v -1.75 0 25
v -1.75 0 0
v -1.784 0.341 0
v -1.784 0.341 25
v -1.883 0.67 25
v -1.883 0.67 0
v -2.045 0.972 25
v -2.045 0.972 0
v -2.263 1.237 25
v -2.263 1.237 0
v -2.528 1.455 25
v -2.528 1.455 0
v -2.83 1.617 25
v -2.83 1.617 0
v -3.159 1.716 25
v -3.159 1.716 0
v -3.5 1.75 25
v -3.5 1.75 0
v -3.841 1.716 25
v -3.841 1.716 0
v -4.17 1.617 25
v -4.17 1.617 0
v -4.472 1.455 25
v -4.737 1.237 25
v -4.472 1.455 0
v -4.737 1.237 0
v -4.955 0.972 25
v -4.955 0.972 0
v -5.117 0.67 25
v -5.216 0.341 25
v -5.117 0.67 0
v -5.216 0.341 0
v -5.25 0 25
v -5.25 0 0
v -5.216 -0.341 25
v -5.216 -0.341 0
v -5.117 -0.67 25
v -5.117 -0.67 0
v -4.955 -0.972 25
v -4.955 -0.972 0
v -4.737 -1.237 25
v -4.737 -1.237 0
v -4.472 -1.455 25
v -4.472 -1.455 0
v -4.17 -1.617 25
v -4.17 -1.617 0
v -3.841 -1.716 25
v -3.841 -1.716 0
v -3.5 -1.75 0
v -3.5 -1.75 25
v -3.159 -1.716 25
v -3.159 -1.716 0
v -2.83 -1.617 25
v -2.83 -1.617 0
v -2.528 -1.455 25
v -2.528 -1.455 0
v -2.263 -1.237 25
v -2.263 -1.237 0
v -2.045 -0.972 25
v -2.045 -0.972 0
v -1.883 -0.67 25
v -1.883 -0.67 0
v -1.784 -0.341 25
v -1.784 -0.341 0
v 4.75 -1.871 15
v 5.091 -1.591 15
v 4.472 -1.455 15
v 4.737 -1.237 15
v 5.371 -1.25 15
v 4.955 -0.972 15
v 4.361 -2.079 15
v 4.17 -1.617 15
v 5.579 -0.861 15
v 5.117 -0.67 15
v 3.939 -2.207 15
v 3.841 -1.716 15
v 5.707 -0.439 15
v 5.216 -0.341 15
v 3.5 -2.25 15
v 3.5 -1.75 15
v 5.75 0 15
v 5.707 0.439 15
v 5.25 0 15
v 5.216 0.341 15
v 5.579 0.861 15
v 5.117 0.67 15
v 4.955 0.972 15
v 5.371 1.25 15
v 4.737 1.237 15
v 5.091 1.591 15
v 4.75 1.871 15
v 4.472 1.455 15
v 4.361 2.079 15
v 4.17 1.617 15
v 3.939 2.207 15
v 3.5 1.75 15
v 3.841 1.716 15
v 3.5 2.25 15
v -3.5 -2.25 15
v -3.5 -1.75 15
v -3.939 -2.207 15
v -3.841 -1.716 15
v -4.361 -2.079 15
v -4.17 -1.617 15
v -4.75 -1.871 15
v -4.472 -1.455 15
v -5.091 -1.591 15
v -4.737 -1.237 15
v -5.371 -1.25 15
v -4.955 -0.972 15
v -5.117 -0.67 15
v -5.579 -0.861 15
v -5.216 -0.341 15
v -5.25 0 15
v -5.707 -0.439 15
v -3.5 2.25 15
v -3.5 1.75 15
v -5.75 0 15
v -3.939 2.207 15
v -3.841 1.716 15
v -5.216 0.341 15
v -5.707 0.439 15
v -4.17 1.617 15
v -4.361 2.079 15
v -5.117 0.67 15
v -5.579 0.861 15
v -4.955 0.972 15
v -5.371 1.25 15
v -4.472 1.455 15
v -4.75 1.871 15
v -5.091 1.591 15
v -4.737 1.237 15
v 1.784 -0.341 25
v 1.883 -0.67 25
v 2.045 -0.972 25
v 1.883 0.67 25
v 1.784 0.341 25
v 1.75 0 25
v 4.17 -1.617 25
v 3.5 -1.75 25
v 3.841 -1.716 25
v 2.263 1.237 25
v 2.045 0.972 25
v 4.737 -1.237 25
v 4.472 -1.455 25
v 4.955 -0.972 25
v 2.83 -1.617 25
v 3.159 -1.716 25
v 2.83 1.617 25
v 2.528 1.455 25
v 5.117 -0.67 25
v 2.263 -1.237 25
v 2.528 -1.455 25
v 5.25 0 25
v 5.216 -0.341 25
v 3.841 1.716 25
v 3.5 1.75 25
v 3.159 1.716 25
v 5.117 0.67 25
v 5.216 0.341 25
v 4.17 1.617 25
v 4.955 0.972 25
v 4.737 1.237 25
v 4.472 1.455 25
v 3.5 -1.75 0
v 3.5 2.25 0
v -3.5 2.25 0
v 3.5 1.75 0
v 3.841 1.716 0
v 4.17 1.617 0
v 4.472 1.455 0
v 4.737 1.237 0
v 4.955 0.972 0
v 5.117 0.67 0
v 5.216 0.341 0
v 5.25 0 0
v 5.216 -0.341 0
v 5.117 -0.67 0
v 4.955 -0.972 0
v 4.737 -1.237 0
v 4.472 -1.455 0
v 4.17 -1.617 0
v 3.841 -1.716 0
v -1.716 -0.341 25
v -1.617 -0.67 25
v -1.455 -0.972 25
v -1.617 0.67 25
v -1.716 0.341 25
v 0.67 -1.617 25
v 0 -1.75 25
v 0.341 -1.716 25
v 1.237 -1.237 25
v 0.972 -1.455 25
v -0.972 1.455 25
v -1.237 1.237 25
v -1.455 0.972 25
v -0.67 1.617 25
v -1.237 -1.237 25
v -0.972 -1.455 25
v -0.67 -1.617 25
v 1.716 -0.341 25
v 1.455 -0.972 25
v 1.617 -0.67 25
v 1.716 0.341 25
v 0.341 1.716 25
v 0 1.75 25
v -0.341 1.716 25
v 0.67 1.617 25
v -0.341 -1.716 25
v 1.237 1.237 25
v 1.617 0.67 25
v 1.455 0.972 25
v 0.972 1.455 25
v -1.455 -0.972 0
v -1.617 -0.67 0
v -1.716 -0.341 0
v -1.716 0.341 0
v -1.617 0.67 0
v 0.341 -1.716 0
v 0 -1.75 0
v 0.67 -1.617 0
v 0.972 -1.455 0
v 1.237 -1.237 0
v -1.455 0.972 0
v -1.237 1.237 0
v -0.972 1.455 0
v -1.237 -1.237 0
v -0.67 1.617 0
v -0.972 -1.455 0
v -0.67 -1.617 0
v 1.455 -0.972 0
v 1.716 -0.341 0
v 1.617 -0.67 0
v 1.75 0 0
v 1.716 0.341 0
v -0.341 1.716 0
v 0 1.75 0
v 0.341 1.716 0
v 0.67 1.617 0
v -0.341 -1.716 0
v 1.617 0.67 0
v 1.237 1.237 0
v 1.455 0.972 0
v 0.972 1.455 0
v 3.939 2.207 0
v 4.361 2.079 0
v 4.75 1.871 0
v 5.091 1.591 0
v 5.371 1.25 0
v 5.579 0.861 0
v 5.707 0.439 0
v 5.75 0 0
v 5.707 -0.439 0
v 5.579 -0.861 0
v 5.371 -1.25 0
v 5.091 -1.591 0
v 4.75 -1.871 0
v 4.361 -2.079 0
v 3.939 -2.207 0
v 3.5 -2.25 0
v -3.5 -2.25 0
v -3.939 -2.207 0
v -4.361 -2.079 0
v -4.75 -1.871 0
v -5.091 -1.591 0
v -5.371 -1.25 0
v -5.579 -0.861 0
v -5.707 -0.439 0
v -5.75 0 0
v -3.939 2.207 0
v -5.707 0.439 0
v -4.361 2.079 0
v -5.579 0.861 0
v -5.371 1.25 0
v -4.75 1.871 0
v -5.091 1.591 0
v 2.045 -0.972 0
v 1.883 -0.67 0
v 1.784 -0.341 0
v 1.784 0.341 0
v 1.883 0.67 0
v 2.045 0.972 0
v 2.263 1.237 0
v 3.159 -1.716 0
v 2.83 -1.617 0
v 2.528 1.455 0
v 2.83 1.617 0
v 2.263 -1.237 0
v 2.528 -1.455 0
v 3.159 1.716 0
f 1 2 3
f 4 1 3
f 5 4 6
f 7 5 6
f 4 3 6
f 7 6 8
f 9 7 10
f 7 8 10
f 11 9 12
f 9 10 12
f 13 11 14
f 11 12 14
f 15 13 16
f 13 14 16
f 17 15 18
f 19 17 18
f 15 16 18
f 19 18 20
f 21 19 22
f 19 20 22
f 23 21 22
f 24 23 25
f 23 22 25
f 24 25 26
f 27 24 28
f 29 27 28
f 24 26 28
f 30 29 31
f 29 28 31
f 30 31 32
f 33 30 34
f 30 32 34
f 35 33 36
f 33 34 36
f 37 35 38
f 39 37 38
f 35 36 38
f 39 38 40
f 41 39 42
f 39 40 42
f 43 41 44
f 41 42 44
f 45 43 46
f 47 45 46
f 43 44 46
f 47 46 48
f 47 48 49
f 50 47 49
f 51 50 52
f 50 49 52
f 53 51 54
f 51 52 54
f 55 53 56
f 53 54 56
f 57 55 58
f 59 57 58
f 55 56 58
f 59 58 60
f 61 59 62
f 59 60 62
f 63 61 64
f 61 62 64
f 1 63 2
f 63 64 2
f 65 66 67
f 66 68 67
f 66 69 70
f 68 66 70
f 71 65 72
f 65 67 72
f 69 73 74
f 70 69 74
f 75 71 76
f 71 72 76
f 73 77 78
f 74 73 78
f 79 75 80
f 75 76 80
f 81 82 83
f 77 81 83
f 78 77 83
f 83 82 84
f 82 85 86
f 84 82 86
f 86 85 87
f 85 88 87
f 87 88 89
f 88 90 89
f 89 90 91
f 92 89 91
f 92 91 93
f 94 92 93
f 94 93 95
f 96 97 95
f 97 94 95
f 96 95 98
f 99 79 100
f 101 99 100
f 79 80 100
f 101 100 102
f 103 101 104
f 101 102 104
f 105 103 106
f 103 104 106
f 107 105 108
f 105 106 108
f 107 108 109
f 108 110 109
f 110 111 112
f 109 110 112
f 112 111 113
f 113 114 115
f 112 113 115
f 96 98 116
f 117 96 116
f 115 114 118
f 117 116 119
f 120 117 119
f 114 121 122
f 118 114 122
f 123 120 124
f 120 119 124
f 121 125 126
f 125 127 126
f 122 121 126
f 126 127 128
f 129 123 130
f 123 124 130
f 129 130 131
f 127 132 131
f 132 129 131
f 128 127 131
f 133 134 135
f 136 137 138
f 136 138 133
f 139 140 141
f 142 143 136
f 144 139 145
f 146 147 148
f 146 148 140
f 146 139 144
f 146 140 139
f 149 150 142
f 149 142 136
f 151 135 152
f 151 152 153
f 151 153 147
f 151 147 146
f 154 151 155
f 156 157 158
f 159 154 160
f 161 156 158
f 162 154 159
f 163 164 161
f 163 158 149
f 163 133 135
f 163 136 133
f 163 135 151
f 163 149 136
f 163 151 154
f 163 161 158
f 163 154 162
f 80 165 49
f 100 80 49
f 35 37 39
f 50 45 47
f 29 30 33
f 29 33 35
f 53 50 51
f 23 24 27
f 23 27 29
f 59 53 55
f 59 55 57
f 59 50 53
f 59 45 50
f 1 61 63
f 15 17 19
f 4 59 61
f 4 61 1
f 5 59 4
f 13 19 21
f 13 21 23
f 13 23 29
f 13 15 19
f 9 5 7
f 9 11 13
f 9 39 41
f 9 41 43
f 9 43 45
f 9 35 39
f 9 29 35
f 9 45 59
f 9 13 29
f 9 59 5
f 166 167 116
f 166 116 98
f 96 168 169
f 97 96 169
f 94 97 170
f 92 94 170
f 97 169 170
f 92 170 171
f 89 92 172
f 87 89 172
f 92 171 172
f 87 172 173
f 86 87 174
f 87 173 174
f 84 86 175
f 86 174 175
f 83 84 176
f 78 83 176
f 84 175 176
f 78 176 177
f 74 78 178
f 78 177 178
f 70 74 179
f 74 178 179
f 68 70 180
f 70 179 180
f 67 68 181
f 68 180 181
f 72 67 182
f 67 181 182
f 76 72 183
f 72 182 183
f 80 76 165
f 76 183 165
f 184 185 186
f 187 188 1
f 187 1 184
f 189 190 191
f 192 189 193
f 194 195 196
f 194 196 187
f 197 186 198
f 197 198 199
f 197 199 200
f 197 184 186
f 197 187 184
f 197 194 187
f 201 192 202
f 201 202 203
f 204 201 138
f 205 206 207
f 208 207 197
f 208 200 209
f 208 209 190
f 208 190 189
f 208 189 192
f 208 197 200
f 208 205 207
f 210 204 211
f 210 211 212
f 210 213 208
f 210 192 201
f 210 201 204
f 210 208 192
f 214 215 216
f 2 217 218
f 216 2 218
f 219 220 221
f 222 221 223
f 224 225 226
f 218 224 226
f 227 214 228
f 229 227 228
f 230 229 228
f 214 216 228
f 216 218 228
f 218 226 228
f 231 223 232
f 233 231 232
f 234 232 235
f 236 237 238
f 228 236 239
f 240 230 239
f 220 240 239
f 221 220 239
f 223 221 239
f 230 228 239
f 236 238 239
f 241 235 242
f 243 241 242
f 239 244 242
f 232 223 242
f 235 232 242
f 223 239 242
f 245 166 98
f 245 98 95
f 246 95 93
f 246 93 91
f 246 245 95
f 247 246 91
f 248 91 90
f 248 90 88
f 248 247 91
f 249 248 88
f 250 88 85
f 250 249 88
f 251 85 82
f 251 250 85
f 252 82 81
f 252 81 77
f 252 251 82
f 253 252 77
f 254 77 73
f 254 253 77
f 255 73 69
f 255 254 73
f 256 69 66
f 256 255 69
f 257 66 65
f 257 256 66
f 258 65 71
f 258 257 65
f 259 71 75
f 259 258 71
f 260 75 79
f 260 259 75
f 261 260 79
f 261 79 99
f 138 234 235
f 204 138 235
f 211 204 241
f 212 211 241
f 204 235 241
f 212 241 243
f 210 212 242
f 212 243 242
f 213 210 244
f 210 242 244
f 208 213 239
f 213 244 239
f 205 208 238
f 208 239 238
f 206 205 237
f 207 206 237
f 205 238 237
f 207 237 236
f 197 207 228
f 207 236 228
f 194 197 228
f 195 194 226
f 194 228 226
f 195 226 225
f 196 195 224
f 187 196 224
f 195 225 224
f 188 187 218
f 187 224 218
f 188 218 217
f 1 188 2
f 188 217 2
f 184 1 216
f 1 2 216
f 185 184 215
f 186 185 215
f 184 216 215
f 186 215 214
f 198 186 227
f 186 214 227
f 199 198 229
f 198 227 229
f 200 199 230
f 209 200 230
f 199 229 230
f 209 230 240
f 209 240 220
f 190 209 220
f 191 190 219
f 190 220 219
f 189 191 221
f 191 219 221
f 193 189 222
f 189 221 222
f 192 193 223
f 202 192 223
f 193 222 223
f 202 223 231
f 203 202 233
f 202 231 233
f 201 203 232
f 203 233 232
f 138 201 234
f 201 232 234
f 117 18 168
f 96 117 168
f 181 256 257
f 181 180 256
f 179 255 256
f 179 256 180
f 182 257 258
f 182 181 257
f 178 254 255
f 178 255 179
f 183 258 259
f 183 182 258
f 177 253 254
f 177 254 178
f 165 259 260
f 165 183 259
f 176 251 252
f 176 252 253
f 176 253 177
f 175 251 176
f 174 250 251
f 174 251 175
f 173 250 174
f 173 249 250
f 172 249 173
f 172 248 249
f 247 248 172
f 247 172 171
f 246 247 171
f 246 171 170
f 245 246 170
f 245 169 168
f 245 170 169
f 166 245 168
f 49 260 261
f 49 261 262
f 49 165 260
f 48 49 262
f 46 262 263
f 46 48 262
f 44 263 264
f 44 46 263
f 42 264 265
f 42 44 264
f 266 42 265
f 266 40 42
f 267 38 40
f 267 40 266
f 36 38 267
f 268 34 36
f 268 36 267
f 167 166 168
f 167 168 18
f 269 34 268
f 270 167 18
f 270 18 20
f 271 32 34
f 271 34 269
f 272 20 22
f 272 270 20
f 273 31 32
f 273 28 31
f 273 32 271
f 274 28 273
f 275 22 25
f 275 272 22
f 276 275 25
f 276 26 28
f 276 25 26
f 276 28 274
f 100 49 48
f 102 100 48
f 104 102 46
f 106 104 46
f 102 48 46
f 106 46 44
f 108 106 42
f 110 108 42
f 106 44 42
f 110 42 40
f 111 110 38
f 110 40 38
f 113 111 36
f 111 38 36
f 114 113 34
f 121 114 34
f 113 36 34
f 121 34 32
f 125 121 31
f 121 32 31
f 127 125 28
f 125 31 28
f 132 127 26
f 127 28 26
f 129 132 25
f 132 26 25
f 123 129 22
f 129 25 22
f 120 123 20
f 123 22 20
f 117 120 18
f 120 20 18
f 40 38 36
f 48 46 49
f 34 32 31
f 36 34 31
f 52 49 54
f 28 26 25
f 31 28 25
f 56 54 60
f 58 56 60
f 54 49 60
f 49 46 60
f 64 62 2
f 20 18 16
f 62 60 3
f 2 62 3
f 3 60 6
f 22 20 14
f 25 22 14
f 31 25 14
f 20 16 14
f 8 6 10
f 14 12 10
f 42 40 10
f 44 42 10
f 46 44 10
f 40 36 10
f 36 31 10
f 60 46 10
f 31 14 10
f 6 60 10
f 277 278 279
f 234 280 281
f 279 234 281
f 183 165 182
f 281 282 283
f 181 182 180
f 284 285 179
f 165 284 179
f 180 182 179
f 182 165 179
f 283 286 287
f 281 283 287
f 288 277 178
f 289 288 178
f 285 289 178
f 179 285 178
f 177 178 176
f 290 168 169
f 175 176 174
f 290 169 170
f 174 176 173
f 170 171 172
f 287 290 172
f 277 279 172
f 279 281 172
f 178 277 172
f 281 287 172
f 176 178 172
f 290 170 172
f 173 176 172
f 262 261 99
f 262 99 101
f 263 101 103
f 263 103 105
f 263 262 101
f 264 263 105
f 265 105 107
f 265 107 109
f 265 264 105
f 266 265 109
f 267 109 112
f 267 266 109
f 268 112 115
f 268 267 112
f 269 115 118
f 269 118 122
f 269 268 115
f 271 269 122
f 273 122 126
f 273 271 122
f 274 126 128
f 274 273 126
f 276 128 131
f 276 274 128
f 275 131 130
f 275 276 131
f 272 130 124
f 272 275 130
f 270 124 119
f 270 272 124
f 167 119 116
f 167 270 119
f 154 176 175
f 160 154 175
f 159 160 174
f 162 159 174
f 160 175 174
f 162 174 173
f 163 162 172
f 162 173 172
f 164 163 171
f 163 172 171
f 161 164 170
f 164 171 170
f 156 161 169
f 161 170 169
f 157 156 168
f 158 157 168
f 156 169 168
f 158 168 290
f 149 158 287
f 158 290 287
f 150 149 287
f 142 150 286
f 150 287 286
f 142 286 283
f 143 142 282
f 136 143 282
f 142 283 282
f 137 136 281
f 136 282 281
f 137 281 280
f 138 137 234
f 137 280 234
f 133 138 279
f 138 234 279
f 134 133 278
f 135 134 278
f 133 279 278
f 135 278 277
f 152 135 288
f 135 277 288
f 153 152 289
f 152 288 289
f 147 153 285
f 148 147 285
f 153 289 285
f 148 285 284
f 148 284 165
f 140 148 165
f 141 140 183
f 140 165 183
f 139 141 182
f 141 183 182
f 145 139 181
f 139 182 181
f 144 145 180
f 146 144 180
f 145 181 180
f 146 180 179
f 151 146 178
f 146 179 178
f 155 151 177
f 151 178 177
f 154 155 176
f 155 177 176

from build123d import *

# Parameters (mm, degrees)
SKETCH2_R             = 1.75
BOSS_EXTRUDE1_DEPTH   = 25
BOSS_EXTRUDE1_2_DEPTH = 25
BOSS_EXTRUDE1_3_DEPTH = 25
EXTRUDE_THIN1_DEPTH   = 15


with BuildPart() as part:
    # Sketch2 → Boss-Extrude1 (new body)
    with BuildSketch(Plane.XY):
        with Locations((3.5, 0)):
            Circle(SKETCH2_R)
    extrude(amount=BOSS_EXTRUDE1_DEPTH)


with BuildPart() as body_2:
    # Sketch2 → Boss-Extrude1 2 (new body)
    with BuildSketch(Plane.XY):
        Circle(SKETCH2_R)
    extrude(amount=BOSS_EXTRUDE1_2_DEPTH)


with BuildPart() as body_3:
    # Sketch2 → Boss-Extrude1 3 (new body)
    with BuildSketch(Plane.XY):
        with Locations((-3.5, 0)):
            Circle(SKETCH2_R)
    extrude(amount=BOSS_EXTRUDE1_3_DEPTH)


with BuildPart() as body_4:
    # Sketch3 → Extrude-Thin1 (new body)
    with BuildSketch(Plane.XY):
        with BuildLine():
            Line((3.5, -2.25), (-3.5, -2.25))
            ThreePointArc((-3.5, -2.25), (-5.75, 0), (-3.5, 2.25))
            Line((-3.5, 2.25), (3.5, 2.25))
            ThreePointArc((3.5, 2.25), (5.75, 0), (3.5, -2.25))
        make_face()
        with BuildLine():
            Line((3.5, -1.75), (-3.5, -1.75))
            ThreePointArc((-3.5, -1.75), (-5.25, 0), (-3.5, 1.75))
            Line((-3.5, 1.75), (3.5, 1.75))
            ThreePointArc((3.5, 1.75), (5.25, 0), (3.5, -1.75))
        make_face(mode=Mode.SUBTRACT)
    extrude(amount=EXTRUDE_THIN1_DEPTH)


solid = Compound([part.part, body_2.part, body_3.part, body_4.part])
